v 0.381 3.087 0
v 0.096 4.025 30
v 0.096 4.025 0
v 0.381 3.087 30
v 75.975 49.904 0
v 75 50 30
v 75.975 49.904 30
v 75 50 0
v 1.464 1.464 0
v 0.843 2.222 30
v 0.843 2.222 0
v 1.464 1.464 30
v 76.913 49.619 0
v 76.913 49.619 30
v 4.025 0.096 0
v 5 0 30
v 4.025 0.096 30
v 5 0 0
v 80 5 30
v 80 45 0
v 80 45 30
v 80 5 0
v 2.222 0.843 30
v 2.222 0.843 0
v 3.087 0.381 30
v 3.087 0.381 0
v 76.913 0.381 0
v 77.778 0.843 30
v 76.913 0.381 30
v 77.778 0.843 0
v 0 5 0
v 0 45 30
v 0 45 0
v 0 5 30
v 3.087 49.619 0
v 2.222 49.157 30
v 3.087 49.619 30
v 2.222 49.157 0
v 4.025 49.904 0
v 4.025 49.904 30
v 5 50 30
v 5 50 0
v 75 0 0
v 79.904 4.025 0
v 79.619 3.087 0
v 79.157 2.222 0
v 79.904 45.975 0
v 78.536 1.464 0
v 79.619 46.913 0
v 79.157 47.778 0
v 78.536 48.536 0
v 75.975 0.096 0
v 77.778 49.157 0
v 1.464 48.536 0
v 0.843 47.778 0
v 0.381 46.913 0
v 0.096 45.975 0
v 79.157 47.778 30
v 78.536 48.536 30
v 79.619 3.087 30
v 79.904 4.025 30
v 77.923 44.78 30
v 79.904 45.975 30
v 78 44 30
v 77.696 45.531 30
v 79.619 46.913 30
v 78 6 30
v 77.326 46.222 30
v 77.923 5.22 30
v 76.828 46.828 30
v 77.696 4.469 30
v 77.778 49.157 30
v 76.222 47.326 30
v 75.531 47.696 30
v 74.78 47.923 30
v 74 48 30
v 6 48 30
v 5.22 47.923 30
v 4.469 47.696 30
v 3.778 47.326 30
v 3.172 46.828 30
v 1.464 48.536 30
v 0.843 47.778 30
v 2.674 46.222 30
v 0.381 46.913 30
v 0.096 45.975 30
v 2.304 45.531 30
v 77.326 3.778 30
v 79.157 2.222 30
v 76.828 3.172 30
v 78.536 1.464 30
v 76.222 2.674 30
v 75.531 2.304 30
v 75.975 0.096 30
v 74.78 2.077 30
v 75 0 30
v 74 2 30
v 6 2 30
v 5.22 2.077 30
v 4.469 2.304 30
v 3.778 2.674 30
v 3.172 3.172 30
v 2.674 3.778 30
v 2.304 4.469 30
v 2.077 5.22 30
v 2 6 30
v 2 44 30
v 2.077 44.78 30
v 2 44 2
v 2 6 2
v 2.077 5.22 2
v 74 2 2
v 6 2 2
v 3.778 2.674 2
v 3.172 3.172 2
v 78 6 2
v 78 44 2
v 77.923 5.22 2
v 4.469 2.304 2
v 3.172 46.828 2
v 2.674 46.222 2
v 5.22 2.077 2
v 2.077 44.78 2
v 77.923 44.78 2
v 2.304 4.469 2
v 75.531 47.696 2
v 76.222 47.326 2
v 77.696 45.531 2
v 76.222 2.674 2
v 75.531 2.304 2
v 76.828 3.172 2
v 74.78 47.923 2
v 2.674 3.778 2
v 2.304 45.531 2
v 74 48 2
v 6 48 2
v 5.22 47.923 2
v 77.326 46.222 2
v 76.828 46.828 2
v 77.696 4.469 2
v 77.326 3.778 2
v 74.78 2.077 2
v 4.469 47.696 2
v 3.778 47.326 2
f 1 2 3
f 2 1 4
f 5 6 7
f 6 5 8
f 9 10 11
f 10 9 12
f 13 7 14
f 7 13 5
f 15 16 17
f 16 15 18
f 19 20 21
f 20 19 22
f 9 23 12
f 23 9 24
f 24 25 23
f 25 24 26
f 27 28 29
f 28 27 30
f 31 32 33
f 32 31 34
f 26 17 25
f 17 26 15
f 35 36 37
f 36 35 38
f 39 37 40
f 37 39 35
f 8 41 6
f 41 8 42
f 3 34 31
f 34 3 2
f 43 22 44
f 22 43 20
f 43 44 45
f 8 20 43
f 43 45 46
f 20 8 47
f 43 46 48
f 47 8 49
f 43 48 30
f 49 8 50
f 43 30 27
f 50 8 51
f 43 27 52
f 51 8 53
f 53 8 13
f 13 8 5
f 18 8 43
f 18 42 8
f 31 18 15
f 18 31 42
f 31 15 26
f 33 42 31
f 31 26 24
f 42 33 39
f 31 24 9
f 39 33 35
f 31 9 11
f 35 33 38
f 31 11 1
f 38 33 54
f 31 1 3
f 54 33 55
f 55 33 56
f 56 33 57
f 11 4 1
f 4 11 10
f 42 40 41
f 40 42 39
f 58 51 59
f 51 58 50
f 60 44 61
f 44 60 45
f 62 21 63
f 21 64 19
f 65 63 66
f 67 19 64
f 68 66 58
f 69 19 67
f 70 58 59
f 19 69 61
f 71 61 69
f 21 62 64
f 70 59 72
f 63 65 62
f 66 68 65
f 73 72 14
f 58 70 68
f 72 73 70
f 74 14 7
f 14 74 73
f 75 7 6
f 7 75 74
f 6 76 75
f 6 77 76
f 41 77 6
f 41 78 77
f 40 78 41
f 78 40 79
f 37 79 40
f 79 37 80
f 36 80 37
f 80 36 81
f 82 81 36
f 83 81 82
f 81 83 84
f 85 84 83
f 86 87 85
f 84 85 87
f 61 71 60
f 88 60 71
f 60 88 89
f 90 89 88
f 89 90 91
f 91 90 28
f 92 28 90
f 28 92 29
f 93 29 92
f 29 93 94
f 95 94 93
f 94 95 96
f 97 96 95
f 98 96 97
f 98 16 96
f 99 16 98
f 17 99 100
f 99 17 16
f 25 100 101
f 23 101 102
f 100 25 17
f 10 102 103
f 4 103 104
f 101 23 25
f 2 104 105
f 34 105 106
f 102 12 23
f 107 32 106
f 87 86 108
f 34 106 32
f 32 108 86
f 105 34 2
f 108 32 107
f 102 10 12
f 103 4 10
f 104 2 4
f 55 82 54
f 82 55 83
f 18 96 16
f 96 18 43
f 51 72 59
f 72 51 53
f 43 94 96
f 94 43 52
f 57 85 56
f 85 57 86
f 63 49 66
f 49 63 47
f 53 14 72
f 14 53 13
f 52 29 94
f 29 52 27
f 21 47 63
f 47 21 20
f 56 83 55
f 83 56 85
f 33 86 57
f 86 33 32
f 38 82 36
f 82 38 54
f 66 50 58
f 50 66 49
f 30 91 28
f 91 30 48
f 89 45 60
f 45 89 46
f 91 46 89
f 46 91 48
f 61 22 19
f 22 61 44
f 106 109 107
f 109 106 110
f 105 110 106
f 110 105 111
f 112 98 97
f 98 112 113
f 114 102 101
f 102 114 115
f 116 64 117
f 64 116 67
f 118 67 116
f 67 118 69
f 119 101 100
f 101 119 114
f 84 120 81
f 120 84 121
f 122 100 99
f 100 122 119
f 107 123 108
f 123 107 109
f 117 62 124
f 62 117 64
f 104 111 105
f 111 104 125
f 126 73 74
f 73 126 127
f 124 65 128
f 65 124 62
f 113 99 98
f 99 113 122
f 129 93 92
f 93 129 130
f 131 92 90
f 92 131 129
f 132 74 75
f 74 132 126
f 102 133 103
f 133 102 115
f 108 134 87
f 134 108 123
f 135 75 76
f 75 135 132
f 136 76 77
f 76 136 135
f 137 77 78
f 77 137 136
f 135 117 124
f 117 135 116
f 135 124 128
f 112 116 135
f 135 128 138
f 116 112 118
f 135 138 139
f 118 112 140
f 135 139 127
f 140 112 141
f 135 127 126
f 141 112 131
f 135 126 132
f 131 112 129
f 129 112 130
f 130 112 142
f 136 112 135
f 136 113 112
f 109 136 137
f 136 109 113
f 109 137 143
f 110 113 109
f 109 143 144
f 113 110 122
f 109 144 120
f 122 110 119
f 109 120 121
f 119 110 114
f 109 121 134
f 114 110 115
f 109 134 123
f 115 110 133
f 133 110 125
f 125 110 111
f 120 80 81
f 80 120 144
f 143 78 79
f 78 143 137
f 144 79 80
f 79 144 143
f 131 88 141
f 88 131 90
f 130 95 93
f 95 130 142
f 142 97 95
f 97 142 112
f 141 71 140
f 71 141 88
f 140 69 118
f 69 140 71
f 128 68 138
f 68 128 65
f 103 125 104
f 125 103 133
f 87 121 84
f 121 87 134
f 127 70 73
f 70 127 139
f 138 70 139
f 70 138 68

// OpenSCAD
// Parametric rounded box with configurable corner radius
// Good for enclosures, cases, and containers

box_length = 80;
box_width = 50;
box_height = 30;
corner_radius = 5;
wall_thickness = 2;

module rounded_box(length, width, height, radius) {
    hull() {
        for (x = [radius, length - radius])
            for (y = [radius, width - radius])
                translate([x, y, 0])
                cylinder(r=radius, h=height, $fn=32);
    }
}

difference() {
    rounded_box(box_length, box_width, box_height, corner_radius);
    
    // Hollow out the inside
    translate([wall_thickness, wall_thickness, wall_thickness])
    rounded_box(
        box_length - 2*wall_thickness,
        box_width - 2*wall_thickness,
        box_height,
        corner_radius - wall_thickness/2
    );
}
